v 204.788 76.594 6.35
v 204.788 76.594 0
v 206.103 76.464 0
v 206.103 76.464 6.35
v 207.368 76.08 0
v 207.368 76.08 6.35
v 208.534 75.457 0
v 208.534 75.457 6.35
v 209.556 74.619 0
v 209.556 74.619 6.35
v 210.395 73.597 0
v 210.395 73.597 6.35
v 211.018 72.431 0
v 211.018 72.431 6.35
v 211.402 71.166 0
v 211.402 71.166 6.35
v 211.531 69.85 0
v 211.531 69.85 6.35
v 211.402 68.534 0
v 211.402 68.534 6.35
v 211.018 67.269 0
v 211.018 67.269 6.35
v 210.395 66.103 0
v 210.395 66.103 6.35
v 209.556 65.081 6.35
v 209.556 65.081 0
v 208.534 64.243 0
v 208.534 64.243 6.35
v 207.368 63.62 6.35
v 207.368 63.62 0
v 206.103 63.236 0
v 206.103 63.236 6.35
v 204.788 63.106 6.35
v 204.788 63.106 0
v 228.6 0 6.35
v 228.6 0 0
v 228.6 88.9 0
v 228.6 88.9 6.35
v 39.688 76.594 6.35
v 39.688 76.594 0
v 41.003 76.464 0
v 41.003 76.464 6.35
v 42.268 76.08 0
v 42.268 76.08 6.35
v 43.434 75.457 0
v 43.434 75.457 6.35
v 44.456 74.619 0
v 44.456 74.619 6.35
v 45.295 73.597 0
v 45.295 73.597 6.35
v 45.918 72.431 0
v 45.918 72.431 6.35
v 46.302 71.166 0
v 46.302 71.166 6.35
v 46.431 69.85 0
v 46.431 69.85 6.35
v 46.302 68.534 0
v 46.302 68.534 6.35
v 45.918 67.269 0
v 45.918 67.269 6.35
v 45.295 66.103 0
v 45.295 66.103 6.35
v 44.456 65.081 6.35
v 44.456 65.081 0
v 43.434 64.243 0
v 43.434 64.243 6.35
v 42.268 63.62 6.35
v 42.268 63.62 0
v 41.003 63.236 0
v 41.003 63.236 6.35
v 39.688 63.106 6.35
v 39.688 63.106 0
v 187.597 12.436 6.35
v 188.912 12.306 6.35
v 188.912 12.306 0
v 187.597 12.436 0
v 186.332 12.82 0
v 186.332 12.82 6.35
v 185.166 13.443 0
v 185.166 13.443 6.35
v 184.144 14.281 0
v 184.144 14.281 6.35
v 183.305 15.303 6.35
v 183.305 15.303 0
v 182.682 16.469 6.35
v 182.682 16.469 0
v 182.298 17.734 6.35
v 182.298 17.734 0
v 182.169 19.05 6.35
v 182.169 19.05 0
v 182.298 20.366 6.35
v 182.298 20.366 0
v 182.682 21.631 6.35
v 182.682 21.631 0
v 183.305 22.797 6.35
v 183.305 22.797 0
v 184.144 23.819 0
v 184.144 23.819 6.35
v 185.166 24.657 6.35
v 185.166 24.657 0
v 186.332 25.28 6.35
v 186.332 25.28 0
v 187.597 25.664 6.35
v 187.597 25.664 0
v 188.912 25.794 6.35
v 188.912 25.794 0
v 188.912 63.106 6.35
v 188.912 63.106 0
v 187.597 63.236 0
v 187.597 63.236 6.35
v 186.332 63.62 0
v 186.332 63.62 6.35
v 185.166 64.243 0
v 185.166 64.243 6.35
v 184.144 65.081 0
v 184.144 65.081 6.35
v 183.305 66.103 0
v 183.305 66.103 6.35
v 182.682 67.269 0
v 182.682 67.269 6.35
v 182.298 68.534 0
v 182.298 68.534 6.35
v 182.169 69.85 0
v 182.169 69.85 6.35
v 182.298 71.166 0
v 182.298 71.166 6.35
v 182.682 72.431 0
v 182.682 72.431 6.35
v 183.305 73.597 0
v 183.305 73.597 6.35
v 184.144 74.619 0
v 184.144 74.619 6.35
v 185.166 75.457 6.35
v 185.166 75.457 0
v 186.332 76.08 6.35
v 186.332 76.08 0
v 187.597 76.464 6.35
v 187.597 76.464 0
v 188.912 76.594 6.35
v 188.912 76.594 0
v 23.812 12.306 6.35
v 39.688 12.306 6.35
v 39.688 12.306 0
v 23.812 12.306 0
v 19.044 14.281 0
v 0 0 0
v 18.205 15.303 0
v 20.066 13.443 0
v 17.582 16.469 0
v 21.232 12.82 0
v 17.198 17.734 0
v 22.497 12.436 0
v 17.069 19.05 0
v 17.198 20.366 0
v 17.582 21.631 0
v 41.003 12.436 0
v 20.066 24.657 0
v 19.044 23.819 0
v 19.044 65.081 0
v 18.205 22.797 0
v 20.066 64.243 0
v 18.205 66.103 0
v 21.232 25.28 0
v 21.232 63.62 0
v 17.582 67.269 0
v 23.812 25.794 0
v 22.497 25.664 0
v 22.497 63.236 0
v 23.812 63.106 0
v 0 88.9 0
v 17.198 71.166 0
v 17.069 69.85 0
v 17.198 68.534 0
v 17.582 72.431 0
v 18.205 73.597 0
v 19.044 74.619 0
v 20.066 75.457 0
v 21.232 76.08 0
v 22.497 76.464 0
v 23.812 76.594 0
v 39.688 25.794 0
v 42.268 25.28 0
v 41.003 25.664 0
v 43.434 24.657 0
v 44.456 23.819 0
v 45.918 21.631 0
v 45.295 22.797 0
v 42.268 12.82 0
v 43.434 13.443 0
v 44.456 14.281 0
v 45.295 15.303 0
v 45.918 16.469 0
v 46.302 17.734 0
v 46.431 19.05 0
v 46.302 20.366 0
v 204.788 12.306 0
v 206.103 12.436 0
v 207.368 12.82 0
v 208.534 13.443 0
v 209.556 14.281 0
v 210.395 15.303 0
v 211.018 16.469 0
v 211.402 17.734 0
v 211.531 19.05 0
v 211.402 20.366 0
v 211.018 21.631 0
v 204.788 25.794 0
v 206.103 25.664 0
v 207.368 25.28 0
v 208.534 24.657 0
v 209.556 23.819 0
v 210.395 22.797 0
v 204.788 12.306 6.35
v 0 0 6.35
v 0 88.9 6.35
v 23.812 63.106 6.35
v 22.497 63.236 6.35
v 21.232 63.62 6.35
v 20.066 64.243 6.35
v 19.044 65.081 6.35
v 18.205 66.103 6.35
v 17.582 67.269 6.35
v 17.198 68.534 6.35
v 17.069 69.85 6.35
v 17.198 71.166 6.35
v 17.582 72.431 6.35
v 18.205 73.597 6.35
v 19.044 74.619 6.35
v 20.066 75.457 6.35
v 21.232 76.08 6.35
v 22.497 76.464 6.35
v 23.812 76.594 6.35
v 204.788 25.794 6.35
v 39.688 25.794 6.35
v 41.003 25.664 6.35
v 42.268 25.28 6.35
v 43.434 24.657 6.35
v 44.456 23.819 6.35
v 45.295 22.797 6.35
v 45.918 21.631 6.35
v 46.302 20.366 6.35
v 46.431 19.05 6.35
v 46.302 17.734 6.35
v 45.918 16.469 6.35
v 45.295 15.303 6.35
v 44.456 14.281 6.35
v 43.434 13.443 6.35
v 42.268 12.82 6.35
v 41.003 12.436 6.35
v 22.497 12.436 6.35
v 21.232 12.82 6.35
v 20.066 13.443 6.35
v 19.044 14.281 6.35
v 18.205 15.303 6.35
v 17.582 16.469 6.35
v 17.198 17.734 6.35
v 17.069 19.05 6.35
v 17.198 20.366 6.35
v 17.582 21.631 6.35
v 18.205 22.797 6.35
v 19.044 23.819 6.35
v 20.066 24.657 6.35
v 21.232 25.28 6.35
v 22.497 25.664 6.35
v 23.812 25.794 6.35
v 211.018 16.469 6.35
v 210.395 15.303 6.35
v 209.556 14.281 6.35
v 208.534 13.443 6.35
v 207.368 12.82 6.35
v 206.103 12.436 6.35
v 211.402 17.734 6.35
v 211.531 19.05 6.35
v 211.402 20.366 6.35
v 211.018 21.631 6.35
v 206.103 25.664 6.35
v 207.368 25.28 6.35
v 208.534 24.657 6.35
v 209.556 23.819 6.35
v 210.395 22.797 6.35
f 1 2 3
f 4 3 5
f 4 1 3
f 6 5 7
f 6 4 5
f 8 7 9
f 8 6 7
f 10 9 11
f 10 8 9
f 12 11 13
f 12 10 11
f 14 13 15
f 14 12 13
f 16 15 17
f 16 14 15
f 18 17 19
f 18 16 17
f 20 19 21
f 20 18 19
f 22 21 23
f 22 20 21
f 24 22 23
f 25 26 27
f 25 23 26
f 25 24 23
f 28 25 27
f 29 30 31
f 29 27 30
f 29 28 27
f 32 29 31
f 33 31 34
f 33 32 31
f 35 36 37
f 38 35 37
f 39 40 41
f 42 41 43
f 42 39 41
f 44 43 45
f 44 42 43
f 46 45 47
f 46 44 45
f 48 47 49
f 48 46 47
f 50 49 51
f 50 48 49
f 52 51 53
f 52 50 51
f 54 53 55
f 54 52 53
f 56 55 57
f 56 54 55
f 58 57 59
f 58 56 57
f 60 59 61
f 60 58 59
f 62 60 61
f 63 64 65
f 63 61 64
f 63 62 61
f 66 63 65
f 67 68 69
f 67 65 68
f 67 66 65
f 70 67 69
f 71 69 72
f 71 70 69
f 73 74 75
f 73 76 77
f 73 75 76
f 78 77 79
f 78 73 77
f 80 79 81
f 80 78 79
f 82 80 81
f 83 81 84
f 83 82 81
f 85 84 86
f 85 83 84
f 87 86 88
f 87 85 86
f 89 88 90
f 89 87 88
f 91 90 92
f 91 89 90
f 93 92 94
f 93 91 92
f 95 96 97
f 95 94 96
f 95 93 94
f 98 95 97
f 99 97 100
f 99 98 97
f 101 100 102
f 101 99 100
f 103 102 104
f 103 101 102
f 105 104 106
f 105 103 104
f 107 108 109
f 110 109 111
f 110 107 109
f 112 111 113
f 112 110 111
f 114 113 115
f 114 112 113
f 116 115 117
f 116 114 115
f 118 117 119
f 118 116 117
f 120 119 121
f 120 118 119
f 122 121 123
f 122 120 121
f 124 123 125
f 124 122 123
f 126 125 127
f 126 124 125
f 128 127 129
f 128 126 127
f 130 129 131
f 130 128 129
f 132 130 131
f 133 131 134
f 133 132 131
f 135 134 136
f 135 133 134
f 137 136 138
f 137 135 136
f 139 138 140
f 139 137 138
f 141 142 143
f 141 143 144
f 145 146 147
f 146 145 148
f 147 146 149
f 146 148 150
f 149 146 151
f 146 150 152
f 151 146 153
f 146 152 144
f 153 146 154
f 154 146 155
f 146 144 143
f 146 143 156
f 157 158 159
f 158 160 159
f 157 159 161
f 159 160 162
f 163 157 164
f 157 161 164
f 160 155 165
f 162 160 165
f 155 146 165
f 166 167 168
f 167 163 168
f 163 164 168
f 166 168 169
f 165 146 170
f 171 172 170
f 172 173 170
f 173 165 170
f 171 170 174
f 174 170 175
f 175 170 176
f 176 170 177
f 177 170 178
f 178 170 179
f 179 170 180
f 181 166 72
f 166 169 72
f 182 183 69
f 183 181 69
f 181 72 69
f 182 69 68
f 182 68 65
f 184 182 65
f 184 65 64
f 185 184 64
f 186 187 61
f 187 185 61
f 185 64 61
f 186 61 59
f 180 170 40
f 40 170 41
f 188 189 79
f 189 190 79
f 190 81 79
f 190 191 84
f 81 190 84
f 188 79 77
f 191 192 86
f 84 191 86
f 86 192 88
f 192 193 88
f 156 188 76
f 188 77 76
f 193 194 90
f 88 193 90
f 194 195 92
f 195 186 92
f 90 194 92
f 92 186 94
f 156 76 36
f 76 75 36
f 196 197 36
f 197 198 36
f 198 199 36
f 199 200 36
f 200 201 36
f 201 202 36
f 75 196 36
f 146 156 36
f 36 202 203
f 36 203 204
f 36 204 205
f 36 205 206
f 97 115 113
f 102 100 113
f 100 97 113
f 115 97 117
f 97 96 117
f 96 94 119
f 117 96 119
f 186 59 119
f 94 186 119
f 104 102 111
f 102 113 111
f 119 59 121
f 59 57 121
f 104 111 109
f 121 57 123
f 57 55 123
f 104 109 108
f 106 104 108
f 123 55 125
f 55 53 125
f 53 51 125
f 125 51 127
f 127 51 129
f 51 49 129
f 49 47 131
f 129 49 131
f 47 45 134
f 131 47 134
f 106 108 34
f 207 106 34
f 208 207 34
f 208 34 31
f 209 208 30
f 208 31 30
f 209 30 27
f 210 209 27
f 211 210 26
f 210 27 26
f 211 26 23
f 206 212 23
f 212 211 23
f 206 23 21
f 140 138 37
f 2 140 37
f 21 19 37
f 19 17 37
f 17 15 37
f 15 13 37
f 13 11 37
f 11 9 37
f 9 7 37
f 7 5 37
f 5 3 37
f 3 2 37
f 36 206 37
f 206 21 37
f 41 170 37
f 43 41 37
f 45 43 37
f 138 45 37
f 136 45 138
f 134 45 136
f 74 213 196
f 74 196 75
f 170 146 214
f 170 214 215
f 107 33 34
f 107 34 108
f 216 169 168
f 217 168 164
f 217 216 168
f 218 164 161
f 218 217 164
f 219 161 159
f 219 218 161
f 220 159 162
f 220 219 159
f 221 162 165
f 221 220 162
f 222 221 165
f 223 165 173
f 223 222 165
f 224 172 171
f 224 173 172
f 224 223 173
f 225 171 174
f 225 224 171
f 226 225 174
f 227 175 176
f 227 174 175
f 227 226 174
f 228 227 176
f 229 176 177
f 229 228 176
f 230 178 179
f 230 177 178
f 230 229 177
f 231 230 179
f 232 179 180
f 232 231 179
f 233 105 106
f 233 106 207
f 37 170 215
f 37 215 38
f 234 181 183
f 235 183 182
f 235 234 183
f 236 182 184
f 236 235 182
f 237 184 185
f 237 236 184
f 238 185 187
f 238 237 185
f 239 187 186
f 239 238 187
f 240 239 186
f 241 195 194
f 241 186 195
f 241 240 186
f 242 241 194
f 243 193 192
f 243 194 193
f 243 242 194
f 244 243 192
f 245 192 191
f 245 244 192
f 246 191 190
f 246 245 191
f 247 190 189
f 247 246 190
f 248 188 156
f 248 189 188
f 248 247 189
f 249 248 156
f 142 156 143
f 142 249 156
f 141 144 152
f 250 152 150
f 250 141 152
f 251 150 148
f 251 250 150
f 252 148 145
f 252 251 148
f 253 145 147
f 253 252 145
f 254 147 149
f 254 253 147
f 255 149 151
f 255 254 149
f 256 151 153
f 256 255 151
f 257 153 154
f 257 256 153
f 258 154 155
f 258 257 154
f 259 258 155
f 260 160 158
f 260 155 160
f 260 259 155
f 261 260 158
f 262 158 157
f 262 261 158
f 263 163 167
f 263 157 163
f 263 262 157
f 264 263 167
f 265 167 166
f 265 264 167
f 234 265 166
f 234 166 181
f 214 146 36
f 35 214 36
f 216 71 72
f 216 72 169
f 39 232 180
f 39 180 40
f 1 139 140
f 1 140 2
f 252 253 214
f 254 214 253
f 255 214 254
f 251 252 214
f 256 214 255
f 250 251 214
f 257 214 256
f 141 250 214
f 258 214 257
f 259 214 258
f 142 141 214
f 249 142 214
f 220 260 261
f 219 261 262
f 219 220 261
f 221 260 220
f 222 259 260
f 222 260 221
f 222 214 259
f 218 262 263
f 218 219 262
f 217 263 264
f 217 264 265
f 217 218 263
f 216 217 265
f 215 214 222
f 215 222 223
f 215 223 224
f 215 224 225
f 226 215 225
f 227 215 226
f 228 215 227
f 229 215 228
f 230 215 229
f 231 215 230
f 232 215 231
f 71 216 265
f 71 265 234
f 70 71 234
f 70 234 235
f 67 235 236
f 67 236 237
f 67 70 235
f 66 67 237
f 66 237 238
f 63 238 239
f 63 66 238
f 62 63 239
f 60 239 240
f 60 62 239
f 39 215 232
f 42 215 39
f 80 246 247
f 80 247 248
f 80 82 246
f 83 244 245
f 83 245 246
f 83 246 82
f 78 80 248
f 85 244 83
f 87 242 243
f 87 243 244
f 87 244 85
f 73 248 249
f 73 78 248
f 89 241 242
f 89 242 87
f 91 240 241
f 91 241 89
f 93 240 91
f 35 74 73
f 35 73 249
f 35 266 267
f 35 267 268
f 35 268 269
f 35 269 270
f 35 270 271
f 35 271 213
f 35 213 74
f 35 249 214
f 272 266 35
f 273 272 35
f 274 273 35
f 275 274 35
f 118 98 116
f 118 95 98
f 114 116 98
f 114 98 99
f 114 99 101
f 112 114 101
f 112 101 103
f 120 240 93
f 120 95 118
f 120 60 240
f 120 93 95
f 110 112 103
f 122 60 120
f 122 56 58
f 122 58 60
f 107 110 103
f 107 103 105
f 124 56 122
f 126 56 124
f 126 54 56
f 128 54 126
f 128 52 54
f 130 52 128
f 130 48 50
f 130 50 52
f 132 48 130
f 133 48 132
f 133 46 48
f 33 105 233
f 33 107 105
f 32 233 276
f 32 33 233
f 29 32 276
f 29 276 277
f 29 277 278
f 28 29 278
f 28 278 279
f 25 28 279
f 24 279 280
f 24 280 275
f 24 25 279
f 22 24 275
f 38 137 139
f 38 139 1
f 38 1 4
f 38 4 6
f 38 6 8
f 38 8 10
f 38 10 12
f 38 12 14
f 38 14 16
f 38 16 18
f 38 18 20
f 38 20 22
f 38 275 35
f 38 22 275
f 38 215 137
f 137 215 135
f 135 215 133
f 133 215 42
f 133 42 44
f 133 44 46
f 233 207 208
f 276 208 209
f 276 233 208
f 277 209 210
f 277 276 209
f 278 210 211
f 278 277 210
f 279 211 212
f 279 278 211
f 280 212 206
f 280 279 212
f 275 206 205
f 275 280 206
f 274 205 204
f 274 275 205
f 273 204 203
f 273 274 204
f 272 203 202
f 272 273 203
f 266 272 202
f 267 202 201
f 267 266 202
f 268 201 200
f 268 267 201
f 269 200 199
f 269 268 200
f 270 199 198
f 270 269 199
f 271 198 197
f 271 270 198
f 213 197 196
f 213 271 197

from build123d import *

# Parameters (mm, degrees)
SKETCH1_W           = 228.6
SKETCH1_H           = 88.9
BOSS_EXTRUDE1_DEPTH = 6.35
CUT_EXTRUDE1_DEPTH  = 7.35
LPATTERN1_COUNT     = 2
LPATTERN1_PITCH     = 165.1


with BuildPart() as part:
    # Sketch1 → Boss-Extrude1 (new body)
    with BuildSketch(Plane.XY):
        with Locations((114.3, 44.45)):
            Rectangle(SKETCH1_W, SKETCH1_H)
    extrude(amount=BOSS_EXTRUDE1_DEPTH)

    # Sketch2 → Cut-Extrude1 (cut, through all)
    with BuildSketch(Plane.XY.offset(6.35)):
        with BuildLine():
            Line((23.8125, 76.5937), (39.6875, 76.5937))
            ThreePointArc((39.6875, 76.5937), (46.4312, 69.85), (39.6875, 63.1063))
            Line((39.6875, 63.1063), (23.8125, 63.1063))
            ThreePointArc((23.8125, 63.1063), (17.0688, 69.85), (23.8125, 76.5937))
        make_face()
        with BuildLine():
            Line((23.8125, 25.7937), (39.6875, 25.7937))
            ThreePointArc((39.6875, 25.7937), (46.4312, 19.05), (39.6875, 12.3063))
            Line((39.6875, 12.3063), (23.8125, 12.3063))
            ThreePointArc((23.8125, 12.3063), (17.0688, 19.05), (23.8125, 25.7937))
        make_face()
    cut_extrude1 = extrude(amount=-CUT_EXTRUDE1_DEPTH, mode=Mode.SUBTRACT)

    # LPattern1: Cut-Extrude1 ×2
    with Locations(*[(i * LPATTERN1_PITCH, 0, 0) for i in range(1, LPATTERN1_COUNT)]):
        add(cut_extrude1, mode=Mode.SUBTRACT)


solid = part.part
